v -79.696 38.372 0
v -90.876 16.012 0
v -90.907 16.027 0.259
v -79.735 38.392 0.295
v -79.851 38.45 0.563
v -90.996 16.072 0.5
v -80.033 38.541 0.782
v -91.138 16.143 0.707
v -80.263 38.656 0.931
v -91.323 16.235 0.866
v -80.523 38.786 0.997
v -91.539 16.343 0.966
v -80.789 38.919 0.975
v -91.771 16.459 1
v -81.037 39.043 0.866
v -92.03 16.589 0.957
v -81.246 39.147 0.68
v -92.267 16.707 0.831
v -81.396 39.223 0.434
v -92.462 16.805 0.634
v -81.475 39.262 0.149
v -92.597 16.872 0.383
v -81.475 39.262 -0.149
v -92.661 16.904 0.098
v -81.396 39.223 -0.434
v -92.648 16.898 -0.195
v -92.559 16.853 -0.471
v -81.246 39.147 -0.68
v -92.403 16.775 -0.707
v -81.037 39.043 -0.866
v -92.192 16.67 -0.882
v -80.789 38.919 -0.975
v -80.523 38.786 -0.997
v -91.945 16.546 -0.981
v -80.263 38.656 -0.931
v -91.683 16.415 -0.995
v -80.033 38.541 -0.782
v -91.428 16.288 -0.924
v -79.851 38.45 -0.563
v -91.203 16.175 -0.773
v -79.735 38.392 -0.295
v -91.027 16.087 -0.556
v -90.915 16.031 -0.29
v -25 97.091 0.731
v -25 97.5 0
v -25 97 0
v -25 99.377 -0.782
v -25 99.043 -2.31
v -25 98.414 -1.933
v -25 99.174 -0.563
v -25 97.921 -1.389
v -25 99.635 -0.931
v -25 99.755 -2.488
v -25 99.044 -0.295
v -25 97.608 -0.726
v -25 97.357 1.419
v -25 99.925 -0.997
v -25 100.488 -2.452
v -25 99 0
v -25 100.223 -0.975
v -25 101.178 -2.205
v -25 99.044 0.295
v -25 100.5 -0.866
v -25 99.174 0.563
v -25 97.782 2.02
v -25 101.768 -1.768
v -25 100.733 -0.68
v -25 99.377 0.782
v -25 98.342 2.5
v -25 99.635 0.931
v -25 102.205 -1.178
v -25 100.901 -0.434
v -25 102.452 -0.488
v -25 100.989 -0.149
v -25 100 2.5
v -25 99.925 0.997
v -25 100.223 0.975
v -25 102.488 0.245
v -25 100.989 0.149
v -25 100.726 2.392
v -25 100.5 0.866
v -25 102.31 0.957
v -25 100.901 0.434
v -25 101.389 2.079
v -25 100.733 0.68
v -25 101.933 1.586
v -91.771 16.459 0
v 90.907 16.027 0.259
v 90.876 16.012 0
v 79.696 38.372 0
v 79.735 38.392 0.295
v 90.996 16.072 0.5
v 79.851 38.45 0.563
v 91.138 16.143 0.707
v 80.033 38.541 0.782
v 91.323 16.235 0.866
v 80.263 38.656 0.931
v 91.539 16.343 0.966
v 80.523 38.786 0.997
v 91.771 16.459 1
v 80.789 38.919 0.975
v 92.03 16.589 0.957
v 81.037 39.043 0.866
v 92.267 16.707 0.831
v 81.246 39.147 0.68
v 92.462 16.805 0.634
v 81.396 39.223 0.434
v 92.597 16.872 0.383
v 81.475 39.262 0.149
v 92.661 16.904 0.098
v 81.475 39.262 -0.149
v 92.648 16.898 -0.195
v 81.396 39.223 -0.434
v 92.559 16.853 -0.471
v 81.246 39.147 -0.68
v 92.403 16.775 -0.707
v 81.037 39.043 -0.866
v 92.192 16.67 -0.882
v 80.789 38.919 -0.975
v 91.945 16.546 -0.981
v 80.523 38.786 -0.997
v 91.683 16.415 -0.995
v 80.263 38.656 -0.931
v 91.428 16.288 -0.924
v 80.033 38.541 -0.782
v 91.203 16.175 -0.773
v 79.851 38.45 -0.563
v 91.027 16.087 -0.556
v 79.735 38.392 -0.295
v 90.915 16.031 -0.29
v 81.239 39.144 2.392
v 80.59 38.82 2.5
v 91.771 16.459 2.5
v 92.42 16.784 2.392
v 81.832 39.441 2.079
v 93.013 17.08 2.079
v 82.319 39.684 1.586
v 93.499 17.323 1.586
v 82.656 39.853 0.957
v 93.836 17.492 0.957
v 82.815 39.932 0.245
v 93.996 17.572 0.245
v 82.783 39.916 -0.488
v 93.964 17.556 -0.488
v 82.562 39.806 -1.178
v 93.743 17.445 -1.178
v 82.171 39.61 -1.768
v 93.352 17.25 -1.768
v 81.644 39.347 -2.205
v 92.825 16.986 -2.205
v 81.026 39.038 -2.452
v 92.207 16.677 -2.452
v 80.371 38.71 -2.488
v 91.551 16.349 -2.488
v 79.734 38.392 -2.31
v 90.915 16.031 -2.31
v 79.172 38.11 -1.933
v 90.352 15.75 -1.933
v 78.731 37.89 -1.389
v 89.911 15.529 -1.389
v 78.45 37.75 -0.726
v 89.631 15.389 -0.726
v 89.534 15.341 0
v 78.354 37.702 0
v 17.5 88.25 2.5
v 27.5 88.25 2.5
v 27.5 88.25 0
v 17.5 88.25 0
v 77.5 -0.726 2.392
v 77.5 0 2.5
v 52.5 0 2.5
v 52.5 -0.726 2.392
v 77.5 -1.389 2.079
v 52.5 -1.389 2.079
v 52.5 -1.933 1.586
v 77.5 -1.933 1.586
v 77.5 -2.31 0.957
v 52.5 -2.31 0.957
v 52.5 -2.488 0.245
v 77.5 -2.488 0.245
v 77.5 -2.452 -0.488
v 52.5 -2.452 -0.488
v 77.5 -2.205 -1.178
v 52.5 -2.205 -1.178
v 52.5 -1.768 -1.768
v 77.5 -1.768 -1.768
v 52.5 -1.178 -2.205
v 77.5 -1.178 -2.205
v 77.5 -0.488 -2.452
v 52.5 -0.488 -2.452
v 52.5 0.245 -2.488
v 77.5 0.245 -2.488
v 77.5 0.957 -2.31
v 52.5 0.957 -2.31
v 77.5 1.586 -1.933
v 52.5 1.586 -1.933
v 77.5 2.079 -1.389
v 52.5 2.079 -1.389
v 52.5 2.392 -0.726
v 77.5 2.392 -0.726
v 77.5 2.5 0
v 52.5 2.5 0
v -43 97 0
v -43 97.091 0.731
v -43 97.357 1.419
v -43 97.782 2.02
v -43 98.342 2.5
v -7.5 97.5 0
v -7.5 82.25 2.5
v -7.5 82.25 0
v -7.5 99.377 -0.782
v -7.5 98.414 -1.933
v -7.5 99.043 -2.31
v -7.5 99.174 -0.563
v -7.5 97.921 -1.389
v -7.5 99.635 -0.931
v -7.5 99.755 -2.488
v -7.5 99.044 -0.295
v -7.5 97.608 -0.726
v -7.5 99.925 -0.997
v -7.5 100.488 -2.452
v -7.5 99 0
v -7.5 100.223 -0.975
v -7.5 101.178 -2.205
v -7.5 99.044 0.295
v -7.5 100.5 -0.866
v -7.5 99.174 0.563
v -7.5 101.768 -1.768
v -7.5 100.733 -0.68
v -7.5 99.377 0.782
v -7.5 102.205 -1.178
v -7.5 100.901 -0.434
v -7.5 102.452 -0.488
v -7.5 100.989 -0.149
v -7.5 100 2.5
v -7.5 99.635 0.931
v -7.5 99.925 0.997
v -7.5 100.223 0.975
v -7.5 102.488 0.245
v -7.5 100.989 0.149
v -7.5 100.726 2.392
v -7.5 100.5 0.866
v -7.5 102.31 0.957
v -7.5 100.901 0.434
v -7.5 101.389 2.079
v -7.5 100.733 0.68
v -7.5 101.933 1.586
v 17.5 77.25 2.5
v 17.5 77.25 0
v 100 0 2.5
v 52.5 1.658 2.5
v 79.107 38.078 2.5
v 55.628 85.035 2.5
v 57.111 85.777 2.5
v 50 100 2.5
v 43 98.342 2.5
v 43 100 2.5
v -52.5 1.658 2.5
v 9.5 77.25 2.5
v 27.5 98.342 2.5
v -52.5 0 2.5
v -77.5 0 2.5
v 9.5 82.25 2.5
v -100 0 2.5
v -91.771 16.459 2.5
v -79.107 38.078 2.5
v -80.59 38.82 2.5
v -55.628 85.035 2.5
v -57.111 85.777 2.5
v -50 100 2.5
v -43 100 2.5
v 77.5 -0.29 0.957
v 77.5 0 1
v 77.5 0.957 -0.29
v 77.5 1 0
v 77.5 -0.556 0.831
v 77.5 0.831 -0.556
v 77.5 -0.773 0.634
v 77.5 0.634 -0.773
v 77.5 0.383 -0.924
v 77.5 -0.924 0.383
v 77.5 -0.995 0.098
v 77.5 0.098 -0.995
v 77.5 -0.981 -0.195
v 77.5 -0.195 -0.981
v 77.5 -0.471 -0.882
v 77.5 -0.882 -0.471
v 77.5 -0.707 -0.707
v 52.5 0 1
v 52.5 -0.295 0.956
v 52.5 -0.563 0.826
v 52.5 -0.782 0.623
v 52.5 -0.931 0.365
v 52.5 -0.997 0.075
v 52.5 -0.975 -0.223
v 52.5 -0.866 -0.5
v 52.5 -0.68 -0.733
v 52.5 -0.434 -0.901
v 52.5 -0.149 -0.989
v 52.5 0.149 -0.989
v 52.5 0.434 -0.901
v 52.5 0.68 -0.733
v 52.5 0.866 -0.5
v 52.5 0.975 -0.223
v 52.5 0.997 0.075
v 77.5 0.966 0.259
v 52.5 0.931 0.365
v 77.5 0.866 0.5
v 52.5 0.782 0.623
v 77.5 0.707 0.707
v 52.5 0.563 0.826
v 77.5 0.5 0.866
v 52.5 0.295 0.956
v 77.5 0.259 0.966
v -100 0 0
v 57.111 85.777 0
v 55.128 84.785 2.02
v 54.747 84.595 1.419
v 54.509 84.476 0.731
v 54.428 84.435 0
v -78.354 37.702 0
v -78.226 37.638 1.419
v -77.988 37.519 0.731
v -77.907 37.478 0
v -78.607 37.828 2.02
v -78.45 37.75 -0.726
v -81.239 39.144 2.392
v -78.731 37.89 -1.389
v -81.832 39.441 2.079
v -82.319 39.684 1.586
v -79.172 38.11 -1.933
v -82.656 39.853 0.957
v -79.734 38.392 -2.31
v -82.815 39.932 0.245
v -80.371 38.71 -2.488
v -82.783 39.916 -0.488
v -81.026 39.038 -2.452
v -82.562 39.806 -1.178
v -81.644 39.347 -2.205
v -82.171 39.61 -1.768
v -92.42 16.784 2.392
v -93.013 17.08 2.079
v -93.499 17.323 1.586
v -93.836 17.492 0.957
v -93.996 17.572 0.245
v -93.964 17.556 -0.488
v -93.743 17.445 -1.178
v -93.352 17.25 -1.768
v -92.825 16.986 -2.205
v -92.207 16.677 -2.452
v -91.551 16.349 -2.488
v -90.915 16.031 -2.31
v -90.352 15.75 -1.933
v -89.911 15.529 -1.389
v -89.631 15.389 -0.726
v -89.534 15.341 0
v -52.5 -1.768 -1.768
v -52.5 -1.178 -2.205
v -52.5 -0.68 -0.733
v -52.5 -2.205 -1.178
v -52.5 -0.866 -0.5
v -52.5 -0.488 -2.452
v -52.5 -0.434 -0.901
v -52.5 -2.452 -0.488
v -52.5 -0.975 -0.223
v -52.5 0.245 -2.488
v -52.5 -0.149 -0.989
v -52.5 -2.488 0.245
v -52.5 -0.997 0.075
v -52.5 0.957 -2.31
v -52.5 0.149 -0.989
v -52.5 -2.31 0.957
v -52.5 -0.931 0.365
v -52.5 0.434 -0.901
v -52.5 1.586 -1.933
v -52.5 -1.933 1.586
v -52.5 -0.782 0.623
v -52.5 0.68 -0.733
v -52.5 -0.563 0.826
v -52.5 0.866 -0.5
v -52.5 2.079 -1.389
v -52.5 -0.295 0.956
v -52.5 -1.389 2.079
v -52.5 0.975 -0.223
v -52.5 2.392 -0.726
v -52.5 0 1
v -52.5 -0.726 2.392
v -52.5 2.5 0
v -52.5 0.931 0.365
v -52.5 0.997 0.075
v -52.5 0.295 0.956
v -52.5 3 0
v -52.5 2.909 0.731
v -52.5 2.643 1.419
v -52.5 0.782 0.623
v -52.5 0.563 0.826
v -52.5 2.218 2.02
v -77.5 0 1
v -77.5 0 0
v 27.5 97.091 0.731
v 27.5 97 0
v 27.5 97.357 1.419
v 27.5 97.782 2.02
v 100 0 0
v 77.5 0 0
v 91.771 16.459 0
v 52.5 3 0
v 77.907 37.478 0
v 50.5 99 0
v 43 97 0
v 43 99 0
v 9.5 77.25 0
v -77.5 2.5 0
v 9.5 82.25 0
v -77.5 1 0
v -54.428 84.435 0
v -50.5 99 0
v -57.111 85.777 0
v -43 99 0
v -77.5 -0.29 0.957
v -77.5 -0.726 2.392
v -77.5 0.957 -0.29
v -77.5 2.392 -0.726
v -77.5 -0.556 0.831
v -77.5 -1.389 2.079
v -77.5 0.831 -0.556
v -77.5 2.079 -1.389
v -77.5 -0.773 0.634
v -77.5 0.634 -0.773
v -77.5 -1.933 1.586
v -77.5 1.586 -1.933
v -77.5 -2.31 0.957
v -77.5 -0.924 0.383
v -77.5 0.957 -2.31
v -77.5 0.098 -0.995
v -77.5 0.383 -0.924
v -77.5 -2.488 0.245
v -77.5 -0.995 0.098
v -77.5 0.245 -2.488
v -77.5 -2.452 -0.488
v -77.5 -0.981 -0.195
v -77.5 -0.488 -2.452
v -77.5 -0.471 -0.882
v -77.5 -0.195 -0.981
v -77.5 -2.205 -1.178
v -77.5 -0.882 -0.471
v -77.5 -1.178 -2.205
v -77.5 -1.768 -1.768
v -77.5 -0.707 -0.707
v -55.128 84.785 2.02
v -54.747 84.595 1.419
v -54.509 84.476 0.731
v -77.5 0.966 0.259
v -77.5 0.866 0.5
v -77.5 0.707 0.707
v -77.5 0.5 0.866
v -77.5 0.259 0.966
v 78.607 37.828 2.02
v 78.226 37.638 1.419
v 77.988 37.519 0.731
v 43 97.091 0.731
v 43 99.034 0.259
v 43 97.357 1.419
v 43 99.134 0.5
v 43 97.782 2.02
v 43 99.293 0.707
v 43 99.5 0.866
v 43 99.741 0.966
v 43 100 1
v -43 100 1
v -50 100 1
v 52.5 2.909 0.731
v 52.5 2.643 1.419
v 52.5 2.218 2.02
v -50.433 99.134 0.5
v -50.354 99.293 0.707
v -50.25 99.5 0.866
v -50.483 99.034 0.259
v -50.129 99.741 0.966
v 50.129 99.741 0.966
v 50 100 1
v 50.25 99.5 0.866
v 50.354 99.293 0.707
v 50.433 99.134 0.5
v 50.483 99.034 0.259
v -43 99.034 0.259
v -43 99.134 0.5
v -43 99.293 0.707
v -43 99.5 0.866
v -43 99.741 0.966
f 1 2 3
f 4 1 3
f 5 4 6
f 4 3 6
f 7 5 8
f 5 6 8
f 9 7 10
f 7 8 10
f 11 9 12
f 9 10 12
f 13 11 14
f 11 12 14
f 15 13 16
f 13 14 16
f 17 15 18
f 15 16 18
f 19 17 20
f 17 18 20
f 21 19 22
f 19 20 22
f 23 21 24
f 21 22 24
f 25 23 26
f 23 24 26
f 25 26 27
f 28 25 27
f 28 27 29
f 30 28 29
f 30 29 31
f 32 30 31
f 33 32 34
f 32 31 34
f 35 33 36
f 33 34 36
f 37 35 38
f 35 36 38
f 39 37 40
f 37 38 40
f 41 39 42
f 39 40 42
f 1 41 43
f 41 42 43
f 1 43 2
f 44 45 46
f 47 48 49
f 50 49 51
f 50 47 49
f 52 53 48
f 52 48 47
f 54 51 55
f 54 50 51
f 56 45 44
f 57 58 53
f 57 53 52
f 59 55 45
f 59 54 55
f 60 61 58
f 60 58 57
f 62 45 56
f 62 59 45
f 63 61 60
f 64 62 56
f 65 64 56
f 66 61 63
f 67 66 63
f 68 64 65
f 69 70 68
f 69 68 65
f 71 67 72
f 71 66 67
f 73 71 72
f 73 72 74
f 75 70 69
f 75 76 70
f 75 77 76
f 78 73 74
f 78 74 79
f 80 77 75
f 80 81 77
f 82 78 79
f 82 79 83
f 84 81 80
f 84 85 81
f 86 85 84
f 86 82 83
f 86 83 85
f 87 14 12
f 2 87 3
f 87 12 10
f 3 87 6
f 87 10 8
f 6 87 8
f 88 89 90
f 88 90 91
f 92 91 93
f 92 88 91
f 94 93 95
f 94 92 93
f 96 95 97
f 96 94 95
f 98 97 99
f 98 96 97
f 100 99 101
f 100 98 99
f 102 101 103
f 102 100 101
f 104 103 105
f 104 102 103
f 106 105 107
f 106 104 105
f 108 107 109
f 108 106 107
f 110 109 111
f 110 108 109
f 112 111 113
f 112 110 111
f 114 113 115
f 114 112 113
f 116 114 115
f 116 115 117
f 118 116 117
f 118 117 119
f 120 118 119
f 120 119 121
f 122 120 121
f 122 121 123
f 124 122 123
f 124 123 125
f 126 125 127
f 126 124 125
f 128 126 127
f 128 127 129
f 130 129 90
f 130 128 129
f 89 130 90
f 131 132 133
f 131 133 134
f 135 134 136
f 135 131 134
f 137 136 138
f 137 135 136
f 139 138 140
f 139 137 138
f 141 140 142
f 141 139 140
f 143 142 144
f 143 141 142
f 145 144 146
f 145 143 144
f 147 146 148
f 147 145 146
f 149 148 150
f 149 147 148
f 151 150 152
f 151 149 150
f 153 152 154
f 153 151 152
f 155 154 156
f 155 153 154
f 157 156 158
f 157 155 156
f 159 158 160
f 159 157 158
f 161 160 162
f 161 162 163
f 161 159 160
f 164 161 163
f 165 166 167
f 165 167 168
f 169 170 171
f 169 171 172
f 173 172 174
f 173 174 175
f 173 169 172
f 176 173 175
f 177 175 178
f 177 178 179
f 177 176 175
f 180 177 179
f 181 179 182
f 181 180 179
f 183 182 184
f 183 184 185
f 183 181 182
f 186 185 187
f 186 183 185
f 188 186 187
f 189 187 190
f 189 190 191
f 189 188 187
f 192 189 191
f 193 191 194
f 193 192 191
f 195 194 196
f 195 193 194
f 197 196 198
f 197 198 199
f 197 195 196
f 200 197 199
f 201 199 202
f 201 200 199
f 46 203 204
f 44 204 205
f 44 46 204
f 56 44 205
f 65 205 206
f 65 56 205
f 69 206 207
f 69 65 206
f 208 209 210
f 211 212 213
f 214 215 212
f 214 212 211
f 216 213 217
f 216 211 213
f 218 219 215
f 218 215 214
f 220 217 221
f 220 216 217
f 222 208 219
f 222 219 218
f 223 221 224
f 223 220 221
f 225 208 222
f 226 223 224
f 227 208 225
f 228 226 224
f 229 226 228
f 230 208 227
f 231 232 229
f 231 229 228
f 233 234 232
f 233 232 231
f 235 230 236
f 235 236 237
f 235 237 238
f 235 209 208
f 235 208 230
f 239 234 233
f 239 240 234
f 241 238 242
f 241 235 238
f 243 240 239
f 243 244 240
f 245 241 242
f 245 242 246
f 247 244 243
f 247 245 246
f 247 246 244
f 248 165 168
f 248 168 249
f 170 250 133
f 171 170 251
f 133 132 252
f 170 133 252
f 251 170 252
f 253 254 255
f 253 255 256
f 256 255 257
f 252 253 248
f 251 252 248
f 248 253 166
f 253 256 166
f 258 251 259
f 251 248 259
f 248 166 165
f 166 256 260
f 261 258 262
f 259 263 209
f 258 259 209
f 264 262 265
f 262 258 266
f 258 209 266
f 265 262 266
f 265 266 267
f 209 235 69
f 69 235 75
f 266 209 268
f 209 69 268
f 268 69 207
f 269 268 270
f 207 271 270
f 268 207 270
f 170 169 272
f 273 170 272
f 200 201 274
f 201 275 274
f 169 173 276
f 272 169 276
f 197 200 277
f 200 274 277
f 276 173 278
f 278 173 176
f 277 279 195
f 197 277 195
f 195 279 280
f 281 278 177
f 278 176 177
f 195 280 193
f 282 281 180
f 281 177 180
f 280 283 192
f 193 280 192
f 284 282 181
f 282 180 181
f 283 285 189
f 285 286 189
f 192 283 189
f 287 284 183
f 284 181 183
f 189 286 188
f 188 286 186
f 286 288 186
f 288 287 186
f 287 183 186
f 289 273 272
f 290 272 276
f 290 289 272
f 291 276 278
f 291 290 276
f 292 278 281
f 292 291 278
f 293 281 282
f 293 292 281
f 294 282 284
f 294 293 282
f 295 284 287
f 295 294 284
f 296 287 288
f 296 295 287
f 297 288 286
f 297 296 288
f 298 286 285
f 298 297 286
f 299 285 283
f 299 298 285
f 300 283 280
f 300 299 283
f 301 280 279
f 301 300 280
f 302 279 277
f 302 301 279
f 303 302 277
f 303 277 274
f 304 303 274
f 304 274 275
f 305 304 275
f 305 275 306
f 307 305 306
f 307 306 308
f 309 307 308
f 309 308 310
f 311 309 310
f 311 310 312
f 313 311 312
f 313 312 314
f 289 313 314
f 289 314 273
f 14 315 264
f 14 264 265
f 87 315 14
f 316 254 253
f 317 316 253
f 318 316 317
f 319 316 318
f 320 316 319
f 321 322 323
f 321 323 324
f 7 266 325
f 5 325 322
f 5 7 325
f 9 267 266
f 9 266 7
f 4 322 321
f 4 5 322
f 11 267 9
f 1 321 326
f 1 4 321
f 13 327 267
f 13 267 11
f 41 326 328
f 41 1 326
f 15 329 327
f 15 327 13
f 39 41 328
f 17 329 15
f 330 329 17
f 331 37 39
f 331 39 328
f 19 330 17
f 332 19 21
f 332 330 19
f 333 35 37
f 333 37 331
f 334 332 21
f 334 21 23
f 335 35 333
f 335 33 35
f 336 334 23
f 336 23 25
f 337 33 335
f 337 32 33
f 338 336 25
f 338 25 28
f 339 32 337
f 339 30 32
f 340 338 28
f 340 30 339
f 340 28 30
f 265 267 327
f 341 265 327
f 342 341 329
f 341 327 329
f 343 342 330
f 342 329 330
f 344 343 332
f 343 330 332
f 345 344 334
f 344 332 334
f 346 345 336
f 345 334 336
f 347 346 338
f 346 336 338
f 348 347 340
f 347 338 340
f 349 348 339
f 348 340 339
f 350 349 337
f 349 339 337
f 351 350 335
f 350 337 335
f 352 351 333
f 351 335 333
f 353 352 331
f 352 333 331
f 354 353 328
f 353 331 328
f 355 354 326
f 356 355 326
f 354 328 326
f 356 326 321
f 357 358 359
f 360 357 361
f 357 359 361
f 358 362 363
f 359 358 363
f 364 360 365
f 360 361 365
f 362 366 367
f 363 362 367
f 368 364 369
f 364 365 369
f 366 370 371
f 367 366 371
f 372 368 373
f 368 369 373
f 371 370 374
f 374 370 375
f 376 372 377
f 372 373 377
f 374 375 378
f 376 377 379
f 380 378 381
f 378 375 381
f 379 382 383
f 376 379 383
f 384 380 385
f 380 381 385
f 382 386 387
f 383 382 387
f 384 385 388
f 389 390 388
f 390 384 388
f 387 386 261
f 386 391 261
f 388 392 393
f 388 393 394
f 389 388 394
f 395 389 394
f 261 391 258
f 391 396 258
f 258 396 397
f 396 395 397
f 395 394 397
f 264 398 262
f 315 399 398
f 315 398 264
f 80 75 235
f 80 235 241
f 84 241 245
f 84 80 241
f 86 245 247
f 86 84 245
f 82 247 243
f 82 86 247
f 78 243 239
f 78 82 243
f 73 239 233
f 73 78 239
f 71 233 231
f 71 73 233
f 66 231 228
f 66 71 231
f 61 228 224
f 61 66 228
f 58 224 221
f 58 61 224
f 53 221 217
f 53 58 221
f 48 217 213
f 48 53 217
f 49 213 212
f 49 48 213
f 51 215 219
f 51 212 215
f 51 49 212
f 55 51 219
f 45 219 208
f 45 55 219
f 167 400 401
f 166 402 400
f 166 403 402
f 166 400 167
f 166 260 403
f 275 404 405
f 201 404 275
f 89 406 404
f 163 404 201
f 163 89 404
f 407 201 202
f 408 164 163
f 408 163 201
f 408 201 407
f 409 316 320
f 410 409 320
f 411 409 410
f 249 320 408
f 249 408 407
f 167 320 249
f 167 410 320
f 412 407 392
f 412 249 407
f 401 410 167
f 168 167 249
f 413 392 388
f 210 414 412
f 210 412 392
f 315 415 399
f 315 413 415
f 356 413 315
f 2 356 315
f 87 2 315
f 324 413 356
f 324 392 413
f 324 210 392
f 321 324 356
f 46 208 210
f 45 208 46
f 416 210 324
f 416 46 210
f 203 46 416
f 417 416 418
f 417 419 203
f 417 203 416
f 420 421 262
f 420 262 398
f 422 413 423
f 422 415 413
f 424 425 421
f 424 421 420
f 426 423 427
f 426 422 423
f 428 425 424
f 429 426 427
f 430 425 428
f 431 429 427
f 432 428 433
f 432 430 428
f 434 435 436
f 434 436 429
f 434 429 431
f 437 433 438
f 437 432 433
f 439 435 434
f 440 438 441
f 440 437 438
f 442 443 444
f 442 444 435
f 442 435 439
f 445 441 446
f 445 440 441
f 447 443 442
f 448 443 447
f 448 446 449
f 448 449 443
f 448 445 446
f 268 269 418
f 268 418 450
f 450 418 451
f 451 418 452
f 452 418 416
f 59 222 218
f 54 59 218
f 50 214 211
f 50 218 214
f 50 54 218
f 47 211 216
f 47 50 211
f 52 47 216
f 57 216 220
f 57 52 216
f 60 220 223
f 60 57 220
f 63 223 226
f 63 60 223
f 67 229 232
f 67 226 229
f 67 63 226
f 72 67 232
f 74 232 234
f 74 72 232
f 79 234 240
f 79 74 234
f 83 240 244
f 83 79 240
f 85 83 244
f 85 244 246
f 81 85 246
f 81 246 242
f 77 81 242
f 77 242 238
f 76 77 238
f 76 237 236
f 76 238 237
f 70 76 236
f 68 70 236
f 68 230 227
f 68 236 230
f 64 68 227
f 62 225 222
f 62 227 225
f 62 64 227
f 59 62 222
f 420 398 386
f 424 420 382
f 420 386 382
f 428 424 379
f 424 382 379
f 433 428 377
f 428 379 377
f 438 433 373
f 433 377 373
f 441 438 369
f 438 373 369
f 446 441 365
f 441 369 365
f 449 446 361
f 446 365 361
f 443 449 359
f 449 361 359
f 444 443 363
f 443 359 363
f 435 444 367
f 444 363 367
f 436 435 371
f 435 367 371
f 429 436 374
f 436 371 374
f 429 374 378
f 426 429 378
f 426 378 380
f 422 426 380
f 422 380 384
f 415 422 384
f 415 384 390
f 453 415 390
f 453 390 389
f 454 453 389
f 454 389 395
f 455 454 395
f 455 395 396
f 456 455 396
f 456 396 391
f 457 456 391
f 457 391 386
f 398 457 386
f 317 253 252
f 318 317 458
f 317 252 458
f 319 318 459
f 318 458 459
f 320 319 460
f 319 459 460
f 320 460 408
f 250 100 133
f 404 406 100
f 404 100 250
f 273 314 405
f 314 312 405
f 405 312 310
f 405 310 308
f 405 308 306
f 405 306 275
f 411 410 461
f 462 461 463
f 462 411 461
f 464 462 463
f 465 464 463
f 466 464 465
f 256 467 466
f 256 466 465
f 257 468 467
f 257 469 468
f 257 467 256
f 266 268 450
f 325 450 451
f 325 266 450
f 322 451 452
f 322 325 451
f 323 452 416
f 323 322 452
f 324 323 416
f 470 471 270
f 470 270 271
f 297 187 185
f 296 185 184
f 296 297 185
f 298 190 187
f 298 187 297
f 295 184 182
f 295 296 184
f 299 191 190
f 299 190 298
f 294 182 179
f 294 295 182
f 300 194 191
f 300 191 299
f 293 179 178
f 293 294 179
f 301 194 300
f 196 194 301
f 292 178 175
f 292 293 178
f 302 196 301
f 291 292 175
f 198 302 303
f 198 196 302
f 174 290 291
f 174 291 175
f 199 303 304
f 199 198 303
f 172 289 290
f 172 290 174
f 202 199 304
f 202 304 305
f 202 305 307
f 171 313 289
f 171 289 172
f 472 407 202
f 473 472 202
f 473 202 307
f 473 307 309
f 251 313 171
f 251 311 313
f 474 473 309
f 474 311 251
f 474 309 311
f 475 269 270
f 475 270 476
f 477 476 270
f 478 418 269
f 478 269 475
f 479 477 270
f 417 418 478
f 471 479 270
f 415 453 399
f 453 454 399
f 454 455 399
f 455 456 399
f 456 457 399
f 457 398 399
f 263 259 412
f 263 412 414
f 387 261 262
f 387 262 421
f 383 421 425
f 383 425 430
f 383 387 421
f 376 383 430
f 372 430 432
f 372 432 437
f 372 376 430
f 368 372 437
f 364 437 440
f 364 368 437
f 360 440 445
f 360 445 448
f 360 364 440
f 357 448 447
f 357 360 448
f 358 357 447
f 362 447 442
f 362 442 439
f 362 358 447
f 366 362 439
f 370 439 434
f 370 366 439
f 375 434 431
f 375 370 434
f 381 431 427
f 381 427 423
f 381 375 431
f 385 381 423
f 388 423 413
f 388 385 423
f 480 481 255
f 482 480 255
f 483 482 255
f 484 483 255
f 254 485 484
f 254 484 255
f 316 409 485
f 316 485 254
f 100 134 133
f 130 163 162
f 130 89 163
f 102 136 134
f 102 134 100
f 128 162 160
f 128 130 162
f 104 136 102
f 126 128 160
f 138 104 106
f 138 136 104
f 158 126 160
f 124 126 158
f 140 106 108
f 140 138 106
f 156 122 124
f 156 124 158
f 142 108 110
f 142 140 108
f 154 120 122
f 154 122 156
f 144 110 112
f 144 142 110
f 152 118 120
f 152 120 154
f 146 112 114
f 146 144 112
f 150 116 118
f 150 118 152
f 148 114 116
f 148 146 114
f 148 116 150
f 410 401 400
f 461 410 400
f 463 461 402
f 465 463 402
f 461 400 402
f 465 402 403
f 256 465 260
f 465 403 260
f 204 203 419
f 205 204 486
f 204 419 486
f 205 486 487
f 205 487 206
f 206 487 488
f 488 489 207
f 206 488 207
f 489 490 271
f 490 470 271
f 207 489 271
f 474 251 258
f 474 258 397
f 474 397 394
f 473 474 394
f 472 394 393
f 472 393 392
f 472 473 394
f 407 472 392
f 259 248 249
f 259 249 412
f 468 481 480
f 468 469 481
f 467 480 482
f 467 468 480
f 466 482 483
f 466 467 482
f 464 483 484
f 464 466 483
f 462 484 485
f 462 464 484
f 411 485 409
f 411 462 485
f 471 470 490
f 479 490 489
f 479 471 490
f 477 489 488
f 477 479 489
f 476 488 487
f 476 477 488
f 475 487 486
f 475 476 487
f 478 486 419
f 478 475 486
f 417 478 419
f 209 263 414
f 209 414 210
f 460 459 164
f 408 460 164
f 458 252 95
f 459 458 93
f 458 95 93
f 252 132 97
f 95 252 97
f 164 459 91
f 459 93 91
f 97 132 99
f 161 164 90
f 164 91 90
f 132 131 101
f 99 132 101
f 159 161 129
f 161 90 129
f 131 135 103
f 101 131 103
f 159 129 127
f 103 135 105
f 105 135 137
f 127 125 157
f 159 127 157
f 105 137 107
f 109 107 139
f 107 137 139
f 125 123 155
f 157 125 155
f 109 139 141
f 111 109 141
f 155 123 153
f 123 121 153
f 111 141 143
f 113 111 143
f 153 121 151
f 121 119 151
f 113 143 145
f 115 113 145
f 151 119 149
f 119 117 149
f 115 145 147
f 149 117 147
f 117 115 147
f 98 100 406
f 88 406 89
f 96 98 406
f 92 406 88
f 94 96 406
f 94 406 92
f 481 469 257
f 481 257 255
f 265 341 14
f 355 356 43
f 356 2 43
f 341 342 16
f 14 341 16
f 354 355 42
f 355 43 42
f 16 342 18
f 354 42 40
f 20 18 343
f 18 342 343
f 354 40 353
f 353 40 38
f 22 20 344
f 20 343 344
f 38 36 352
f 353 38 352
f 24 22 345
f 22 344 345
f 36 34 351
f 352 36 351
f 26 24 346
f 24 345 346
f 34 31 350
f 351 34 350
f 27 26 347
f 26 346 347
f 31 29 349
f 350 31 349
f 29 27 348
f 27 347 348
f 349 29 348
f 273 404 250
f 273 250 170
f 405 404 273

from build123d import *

# Parameters (mm, degrees)
EXTRUDE_1_DEPTH                 = 5
SKETCH_3_W                      = 50
SKETCH_3_H                      = 5
SKETCH_7_W                      = 100
SKETCH_7_H                      = 5
CUT_EXTRUDE_1_DEPTH             = 324.341924284
CUT_EXTRUDE_1_DEPTH_BACK        = 324.341924284
SKETCH_8_R                      = 2
SKETCH_6_W                      = 5
SKETCH_6_H                      = 50
SKETCH_9_R                      = 2
CUT_EXTRUDE_2_DEPTH             = 50
SKETCH_10_R                     = 6
CUT_EXTRUDE_3_DEPTH             = 105
CUT_EXTRUDE_4_REACH             = 369.526
SKETCH_11_R                     = 2
CUT_EXTRUDE_4_DIRECTION_2_REACH = 369.526
SKETCH_12_R                     = 6
CUT_EXTRUDE_5_DEPTH             = 210
SKETCH_13_R                     = 6
CUT_EXTRUDE_6_DEPTH             = 36
SCALE_1_SCALE                   = 0.5
CUT_EXTRUDE_8_DEPTH             = 10


with BuildPart() as part:
    # 草图1 → 凸台-拉伸1 (new body)
    with BuildSketch(Plane.XY):
        Polygon((-200, 0), (-100, 200), (100, 200), (200, 0), align=None)
    extrude(amount=EXTRUDE_1_DEPTH)

    # 草图3 → 旋转5 (revolve)
    with BuildSketch(Plane.XZ):
        with Locations((130, 2.5)):
            Rectangle(SKETCH_3_W, SKETCH_3_H)
        with Locations((-130, 2.5)):
            Rectangle(SKETCH_3_W, SKETCH_3_H)
    revolve(axis=Axis((-155, 0, 0), (1, 0, 0)))

    # 草图7 → 旋转1 (revolve)
    with BuildSketch(Plane(origin=(0, 0, 0), x_dir=(-1, 0, 0), z_dir=(0, 0, -1))):
        with Locations((0, 197.5)):
            Rectangle(SKETCH_7_W, SKETCH_7_H)
    revolve(axis=Axis((50, 200, 0), (-1, 0, 0)))

    # 草图8 → 切除-拉伸1 (cut, two sides: drawn at the far end of the back side and taken through both)
    with BuildSketch(Plane(origin=(50, 0, 0), x_dir=(0, 0, -1), z_dir=(1, 0, 0)).offset(-CUT_EXTRUDE_1_DEPTH_BACK)):
        with Locations(Location((0, 200, 0), (0, 0, 270))):
            Circle(SKETCH_8_R)
    extrude(amount=CUT_EXTRUDE_1_DEPTH + CUT_EXTRUDE_1_DEPTH_BACK, mode=Mode.SUBTRACT)

    # 草图6 → 旋转4 (revolve)
    with BuildSketch(Plane(origin=(-160, 80, 0), x_dir=(0, 0, 1), z_dir=(-0.8944271909999159, 0.44721359549995815, 0))):
        with Locations((2.5, -27.639320225)):
            Rectangle(SKETCH_6_W, SKETCH_6_H)
    revolve_4 = revolve(axis=Axis((-161.180339887, 77.639320225, 0), (-0.447213595499958, -0.894427190999916, 0)))

    # 草图9 → 切除-拉伸2 (cut)
    with BuildSketch(Plane(origin=(-23.541019662, -47.082039325, 0), x_dir=(0.8944271909999156, -0.4472135954999583, 0), z_dir=(-0.4472135954999583, -0.8944271909999156, 0))):
        with Locations((-178.8854382, 0)):
            Circle(SKETCH_9_R)
    cut_extrude_2 = extrude(amount=-CUT_EXTRUDE_2_DEPTH, mode=Mode.SUBTRACT)

    # 草图10 → 切除-拉伸3 (cut)
    with BuildSketch(Plane(origin=(-1.180339887, -2.360679775, 0), x_dir=(0.8944271909999156, -0.4472135954999583, 0), z_dir=(0.4472135954999583, 0.8944271909999156, 0))):
        with Locations((-178.8854382, 0)):
            Circle(SKETCH_10_R)
    cut_extrude_3 = extrude(amount=CUT_EXTRUDE_3_DEPTH, mode=Mode.SUBTRACT)

    # 切除-拉伸4: up to this face of the body (flat: up to its plane)
    cut_extrude_4_end = Plane(part.part.faces().sort_by_distance((155, -0.707355303, -0.707355303))[0])
    # 草图11 → 切除-拉伸4 (cut, up to the picked face)
    with BuildSketch(Plane(origin=(-105, 0, 0), x_dir=(0, 0, -1), z_dir=(1, 0, 0)), mode=Mode.PRIVATE) as cut_extrude_4_sk1:
        with Locations(Location((0, 0, 0), (0, 0, 180))):
            Circle(SKETCH_11_R)
    cut_extrude_4_tool1 = split(extrude(cut_extrude_4_sk1.sketch, amount=CUT_EXTRUDE_4_REACH, mode=Mode.PRIVATE), bisect_by=cut_extrude_4_end, keep=Keep.BOTH, mode=Mode.PRIVATE)
    add(cut_extrude_4_tool1.solids().sort_by(Axis((-105, 0, 0), (1, 0, 0)))[0], mode=Mode.SUBTRACT)

    # 切除-拉伸4 direction 2: up to this face of the body (flat: up to its plane)
    cut_extrude_4_direction_2_end = Plane(part.part.faces().sort_by_distance((-155, -0.707355303, -0.707355303))[0])
    # 草图11 → 切除-拉伸4 direction 2 (cut, up to the picked face)
    with BuildSketch(Plane(origin=(-105, 0, 0), x_dir=(0, 0, -1), z_dir=(1, 0, 0)), mode=Mode.PRIVATE) as cut_extrude_4_direction_2_sk1:
        with Locations(Location((0, 0, 0), (0, 0, 180))):
            Circle(SKETCH_11_R)
    cut_extrude_4_direction_2_tool1 = split(extrude(cut_extrude_4_direction_2_sk1.sketch, amount=-CUT_EXTRUDE_4_DIRECTION_2_REACH, mode=Mode.PRIVATE), bisect_by=cut_extrude_4_direction_2_end, keep=Keep.BOTH, mode=Mode.PRIVATE)
    add(cut_extrude_4_direction_2_tool1.solids().sort_by(Axis((-105, 0, 0), (-1, 0, 0)))[0], mode=Mode.SUBTRACT)

    # 镜向1: 旋转4, 切除-拉伸2, 切除-拉伸3 across plane
    add(revolve_4.mirror(Plane(origin=(0, 0, 0), x_dir=(0, 0, 1), z_dir=(1, 0, 0))))
    add(cut_extrude_2.mirror(Plane(origin=(0, 0, 0), x_dir=(0, 0, 1), z_dir=(1, 0, 0))), mode=Mode.SUBTRACT)
    add(cut_extrude_3.mirror(Plane(origin=(0, 0, 0), x_dir=(0, 0, 1), z_dir=(1, 0, 0))), mode=Mode.SUBTRACT)

    # 草图12 → 切除-拉伸5 (cut)
    with BuildSketch(Plane.ZY.offset(-105)):
        Circle(SKETCH_12_R)
    extrude(amount=CUT_EXTRUDE_5_DEPTH, mode=Mode.SUBTRACT)

    # 草图13 → 切除-拉伸6 (cut)
    with BuildSketch(Plane.ZY.offset(50)):
        with Locations((0, 200)):
            Circle(SKETCH_13_R)
    cut_extrude_6 = extrude(amount=CUT_EXTRUDE_6_DEPTH, mode=Mode.SUBTRACT)

    # 镜向2: 切除-拉伸6 across plane
    add(cut_extrude_6.mirror(Plane(origin=(0, 0, 0), x_dir=(0, 0, 1), z_dir=(1, 0, 0))), mode=Mode.SUBTRACT)


with BuildPart() as part_1:
    # 缩放比例1: scaled about (0, 0, 0)
    add(part.part.scale(SCALE_1_SCALE))

    # 草图18 → 切除-拉伸8 (cut)
    with BuildSketch(Plane.XY.offset(2.5)):
        Polygon((27.5, 98.341687605), (27.5, 88.25), (17.5, 88.25), (17.5, 77.25), (9.5, 77.25), (9.5, 82.25), (-7.5, 82.25), (-7.5, 102.5), (25, 102.5), (25, 98.341687605), align=None)
    extrude(amount=-CUT_EXTRUDE_8_DEPTH, mode=Mode.SUBTRACT)


solid = part_1.part
